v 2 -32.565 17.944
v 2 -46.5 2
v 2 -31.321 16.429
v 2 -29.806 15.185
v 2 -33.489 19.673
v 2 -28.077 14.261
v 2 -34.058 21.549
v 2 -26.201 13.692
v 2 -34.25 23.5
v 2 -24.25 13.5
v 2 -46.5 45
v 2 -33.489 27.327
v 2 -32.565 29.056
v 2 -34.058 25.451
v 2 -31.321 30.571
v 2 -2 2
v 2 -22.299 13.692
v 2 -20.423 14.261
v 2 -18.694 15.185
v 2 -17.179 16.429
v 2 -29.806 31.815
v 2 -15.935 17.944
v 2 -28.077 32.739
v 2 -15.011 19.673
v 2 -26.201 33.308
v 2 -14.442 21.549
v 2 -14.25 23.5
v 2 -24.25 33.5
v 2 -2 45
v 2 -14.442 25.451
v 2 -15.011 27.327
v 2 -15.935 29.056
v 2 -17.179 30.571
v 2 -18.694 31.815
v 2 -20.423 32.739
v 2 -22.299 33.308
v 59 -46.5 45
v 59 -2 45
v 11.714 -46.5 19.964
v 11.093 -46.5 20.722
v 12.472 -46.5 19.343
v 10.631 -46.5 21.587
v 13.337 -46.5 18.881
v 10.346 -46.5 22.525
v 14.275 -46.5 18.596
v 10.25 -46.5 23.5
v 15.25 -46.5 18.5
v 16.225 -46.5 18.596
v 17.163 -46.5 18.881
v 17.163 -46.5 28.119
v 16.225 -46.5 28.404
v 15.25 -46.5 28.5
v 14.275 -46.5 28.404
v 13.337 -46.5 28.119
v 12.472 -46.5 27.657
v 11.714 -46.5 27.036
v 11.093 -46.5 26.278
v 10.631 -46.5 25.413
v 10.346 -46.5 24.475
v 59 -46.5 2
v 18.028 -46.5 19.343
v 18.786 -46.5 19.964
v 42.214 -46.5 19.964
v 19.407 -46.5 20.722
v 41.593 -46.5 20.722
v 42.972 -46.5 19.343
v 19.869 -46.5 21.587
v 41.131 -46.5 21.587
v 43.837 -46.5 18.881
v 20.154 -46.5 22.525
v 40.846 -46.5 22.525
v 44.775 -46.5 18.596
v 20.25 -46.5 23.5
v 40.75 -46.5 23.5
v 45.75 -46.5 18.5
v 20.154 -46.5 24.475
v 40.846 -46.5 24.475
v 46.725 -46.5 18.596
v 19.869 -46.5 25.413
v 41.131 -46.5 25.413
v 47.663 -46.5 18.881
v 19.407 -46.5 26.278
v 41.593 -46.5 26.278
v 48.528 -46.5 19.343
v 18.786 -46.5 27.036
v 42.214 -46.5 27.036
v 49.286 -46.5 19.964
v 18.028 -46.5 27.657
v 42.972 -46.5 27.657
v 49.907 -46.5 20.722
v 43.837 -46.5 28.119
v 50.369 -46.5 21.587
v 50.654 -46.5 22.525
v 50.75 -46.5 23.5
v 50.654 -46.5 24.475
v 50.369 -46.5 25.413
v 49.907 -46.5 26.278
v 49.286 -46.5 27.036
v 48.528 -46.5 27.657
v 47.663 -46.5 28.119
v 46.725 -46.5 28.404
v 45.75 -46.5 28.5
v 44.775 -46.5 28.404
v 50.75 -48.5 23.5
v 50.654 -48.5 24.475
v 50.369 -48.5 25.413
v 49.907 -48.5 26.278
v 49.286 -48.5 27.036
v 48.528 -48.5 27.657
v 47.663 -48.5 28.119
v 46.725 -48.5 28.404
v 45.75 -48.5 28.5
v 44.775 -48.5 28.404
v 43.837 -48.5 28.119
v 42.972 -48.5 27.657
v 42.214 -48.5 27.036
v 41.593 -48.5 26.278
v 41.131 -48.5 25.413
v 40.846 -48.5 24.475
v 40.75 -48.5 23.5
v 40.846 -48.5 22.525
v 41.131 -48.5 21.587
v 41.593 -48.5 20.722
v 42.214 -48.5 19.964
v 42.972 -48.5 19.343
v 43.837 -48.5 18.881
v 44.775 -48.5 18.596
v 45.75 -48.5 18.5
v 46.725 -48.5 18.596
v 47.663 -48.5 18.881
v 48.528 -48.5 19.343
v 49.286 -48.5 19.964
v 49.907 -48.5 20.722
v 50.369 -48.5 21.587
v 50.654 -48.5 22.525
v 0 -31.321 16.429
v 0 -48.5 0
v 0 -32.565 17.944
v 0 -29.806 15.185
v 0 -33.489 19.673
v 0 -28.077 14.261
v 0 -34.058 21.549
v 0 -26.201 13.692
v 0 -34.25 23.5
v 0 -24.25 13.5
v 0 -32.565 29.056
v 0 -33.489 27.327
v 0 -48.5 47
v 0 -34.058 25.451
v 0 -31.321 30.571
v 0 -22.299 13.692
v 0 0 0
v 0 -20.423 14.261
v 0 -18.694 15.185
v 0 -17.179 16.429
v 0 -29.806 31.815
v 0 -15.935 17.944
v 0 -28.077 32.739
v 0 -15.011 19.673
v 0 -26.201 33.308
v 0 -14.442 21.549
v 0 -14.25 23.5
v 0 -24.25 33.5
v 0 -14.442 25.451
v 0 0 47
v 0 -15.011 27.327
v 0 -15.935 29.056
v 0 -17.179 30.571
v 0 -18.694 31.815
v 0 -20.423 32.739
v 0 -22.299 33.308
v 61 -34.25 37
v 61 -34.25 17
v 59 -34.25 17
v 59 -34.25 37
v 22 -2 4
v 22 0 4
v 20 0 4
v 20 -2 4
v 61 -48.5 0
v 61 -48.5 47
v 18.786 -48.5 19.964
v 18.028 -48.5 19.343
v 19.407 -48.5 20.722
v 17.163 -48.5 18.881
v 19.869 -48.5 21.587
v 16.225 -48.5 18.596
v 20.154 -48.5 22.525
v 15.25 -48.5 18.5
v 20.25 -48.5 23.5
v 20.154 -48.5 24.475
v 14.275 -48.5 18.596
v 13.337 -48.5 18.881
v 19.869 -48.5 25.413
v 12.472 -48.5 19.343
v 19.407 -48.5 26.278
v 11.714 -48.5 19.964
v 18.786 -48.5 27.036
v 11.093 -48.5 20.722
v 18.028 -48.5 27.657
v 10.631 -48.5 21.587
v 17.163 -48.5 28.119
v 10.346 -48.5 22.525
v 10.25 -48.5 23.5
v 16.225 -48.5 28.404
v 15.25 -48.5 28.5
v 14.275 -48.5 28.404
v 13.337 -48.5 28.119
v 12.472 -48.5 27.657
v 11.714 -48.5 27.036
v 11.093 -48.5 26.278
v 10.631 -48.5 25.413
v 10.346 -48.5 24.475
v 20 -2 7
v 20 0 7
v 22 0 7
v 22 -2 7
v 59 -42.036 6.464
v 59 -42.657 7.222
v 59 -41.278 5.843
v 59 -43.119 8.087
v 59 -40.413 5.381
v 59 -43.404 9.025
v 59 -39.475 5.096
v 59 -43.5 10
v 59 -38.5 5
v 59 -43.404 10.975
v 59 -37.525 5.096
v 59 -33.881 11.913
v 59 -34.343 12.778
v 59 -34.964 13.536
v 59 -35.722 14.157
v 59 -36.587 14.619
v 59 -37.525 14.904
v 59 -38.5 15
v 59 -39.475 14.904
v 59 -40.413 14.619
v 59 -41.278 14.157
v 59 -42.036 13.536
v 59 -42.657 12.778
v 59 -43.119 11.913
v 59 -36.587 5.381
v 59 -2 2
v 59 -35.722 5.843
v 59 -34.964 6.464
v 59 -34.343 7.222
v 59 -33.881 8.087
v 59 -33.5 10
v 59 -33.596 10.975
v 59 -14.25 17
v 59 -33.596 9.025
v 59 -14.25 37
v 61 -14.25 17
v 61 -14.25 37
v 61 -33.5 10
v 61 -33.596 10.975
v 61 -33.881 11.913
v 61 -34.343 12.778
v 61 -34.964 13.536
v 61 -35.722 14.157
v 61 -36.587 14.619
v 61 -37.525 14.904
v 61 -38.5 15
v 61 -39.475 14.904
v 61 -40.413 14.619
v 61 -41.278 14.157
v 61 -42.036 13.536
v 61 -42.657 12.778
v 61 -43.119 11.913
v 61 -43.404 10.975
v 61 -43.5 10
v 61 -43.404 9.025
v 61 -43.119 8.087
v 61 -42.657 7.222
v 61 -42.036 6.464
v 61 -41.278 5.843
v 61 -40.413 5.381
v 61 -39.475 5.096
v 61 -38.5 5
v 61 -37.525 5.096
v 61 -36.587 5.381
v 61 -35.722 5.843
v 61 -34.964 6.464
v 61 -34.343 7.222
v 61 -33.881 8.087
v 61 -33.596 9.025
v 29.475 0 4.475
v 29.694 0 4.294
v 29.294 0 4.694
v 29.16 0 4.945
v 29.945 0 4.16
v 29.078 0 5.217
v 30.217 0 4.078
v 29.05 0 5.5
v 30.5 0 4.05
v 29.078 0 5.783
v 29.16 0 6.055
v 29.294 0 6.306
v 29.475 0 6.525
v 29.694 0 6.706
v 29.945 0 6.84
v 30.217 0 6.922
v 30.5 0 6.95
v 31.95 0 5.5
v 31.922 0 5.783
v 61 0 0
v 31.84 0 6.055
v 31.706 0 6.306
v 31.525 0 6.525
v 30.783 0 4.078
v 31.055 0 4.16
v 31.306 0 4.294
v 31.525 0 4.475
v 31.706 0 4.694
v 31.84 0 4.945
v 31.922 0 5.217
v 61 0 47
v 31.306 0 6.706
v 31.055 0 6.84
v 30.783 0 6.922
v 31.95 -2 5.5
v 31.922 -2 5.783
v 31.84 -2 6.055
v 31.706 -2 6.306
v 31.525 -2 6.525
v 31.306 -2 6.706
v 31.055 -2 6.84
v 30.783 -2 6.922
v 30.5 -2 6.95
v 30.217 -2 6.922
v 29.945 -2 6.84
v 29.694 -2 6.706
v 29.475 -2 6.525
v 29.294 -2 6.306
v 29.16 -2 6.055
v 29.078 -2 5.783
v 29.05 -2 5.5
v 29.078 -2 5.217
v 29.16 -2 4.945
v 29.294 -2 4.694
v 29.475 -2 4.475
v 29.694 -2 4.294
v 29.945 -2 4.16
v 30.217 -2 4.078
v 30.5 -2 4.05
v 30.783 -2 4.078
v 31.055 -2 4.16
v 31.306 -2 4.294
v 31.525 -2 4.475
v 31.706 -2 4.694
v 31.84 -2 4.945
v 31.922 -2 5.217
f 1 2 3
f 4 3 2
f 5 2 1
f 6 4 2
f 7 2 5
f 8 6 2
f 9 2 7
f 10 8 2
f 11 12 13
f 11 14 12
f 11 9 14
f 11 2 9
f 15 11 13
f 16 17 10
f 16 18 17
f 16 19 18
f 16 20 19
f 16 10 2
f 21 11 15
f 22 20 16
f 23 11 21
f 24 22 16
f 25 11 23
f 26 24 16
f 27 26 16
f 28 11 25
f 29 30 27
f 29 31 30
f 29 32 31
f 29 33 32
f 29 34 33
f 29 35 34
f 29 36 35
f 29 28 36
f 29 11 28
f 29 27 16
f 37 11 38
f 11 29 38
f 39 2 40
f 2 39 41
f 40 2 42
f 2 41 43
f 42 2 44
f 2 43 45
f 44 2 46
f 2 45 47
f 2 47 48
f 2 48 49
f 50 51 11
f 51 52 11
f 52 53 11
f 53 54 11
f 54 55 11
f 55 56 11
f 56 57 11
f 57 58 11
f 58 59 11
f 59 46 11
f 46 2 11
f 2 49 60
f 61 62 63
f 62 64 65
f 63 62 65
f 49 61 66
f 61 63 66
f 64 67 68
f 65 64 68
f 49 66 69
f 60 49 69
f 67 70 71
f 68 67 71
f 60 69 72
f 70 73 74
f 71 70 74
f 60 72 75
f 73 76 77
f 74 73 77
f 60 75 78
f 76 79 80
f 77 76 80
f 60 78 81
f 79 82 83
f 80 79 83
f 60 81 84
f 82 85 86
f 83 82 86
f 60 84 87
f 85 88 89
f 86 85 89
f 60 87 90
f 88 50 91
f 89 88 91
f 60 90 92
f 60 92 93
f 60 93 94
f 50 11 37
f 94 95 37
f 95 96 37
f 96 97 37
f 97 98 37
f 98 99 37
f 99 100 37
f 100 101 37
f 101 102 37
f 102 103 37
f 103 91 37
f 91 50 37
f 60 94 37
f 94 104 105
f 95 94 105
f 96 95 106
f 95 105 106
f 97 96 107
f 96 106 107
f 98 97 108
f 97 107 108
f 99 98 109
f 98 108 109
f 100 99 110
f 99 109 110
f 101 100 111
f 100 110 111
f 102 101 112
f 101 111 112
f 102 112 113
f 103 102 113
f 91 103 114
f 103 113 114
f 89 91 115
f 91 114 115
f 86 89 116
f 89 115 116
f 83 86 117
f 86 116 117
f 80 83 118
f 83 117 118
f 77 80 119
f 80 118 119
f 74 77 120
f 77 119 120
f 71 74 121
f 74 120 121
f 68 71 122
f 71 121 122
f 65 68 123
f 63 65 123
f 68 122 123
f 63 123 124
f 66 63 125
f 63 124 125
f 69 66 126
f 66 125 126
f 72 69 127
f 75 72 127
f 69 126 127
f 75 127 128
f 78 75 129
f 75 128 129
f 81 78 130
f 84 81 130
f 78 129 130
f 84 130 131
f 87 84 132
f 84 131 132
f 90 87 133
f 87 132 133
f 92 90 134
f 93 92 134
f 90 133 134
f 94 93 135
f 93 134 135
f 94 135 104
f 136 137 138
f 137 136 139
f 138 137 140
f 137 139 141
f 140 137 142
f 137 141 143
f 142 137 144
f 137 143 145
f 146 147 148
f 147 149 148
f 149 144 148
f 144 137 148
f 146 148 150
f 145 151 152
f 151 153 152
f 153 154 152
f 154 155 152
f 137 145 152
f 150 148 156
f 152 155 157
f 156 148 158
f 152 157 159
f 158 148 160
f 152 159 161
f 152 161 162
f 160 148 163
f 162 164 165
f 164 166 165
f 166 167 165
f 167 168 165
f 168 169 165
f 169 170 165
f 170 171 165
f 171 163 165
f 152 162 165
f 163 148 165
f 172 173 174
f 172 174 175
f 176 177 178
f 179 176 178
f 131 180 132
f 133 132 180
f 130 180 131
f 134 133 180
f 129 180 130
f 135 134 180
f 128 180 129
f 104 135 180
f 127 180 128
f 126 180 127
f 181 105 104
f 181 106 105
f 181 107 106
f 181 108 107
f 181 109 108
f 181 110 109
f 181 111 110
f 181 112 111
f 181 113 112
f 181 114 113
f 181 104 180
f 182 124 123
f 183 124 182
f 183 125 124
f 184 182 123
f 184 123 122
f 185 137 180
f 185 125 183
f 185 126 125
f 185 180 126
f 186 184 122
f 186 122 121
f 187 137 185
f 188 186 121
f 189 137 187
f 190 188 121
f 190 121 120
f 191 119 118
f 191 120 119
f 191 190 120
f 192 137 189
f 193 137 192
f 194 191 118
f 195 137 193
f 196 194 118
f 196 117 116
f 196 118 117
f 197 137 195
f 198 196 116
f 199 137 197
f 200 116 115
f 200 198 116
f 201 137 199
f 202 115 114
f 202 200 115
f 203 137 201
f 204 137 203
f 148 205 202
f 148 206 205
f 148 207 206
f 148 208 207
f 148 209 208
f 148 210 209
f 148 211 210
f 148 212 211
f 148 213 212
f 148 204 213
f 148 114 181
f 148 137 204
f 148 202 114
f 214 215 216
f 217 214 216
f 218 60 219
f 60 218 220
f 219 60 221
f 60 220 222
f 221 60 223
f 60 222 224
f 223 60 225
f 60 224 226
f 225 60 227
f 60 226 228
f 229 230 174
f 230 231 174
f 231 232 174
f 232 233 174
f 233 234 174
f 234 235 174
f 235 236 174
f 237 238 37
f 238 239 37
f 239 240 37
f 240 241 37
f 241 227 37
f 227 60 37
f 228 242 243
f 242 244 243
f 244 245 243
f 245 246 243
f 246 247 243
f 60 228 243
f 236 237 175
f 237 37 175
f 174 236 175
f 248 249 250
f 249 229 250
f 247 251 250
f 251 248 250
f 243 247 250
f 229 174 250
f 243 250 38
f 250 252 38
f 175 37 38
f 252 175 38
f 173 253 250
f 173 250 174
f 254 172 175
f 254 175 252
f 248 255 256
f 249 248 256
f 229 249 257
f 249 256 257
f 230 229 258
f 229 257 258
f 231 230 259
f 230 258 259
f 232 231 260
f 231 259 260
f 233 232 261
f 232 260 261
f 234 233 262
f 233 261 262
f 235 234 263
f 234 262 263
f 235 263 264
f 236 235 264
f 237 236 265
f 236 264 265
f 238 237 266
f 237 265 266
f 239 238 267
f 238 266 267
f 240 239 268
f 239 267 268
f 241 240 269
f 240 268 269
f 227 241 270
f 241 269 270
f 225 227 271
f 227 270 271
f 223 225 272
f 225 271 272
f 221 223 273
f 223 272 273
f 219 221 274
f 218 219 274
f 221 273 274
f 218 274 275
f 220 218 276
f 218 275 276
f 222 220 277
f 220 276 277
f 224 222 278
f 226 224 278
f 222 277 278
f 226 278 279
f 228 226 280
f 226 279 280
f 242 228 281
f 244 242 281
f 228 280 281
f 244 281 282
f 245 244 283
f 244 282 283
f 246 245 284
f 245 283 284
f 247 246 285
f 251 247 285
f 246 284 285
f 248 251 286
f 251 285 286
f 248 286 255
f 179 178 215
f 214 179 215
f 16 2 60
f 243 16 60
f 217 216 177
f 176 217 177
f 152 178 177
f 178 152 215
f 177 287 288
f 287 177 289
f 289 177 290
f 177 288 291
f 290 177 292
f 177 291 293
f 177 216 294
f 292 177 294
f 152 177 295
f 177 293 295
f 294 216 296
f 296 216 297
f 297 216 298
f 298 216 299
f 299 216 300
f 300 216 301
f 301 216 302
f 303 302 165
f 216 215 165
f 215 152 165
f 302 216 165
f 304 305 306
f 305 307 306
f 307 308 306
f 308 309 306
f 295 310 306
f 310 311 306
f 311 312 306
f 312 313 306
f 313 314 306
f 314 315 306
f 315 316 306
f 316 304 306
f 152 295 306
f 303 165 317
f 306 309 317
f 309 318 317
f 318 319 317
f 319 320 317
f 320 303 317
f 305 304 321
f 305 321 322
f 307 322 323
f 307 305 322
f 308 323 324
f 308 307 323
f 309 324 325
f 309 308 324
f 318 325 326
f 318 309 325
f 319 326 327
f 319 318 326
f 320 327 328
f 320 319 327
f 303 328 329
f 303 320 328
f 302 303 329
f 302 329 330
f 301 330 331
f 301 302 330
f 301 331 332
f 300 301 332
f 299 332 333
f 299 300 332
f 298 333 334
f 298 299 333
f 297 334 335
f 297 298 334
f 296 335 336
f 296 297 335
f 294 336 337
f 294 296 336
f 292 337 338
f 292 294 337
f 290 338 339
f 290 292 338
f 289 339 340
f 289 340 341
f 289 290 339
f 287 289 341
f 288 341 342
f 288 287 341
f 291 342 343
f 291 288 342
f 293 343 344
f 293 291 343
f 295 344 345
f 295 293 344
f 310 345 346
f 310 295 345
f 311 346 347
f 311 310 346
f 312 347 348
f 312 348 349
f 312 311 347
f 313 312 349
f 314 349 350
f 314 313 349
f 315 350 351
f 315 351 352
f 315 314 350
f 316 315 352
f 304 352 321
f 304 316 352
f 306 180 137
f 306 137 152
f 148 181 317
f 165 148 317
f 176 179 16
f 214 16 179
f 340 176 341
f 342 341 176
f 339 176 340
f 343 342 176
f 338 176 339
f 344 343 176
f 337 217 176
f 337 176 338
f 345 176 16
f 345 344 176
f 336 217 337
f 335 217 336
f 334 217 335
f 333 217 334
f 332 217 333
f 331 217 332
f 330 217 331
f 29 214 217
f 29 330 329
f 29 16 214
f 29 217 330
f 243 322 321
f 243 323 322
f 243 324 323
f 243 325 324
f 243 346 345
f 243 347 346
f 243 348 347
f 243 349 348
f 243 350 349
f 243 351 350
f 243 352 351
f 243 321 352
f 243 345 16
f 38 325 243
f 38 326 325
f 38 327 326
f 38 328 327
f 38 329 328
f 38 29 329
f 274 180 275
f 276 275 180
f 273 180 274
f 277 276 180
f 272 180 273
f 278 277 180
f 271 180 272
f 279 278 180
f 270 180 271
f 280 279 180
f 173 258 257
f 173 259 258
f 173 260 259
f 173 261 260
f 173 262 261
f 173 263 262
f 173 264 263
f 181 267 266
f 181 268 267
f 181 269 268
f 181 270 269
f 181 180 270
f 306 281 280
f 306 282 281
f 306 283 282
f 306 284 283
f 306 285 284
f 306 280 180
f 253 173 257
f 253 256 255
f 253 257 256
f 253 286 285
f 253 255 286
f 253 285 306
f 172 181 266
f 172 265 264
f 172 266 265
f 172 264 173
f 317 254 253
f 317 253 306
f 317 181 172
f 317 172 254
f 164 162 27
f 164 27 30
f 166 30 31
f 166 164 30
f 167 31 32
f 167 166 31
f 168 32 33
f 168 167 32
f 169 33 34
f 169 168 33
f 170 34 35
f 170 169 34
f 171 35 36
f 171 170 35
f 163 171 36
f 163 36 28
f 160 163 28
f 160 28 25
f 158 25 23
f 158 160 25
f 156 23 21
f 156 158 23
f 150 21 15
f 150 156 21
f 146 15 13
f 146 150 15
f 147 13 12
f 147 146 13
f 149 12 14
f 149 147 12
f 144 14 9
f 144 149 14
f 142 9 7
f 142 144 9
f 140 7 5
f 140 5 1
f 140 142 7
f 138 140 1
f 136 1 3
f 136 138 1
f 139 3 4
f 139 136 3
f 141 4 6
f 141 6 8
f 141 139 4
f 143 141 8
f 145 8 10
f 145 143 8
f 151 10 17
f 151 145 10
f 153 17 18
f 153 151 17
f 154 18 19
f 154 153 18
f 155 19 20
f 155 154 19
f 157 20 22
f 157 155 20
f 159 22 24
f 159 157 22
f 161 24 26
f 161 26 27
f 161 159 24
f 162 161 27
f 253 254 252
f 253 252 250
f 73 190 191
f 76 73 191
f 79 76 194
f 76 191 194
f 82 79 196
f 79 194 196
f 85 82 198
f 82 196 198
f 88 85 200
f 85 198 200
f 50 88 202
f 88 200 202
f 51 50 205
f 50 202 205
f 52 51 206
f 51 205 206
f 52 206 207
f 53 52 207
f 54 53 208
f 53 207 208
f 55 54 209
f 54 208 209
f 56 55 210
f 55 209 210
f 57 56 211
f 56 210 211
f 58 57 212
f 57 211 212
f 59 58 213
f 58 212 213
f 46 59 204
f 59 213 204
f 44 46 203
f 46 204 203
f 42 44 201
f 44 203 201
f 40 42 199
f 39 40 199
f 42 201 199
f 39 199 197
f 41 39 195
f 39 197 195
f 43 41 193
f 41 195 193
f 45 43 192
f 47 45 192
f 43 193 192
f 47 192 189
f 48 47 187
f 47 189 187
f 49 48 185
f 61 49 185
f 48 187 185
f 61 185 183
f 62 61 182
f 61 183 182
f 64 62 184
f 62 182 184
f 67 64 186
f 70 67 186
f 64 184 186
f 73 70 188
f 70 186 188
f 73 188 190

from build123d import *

# Parameters (mm, degrees)
F0_W      = 61
F0_H      = 47
F0_R      = 1.45
F1_DEPTH  = 2
F3_W      = 48.5
F3_H      = 47
F3_R      = 5
F4_DEPTH  = 2
F5_W      = 48.5
F5_H      = 47
F5_R      = 10
F6_DEPTH  = 2
F8_W      = 61
F8_H      = 47
F8_R      = 5
F9_DEPTH  = 2
F11_W     = 61
F11_H     = 48.5
F12_DEPTH = 2
F14_W     = 61
F14_H     = 48.5
F15_DEPTH = 2


with BuildPart() as f1:
    # F0 (on Front) → F1 (new body)
    with BuildSketch(Plane.XZ):
        with Locations((30.5, 23.5)):
            Rectangle(F0_W, F0_H)
        Polygon((20, 5.5), (20, 7), (22, 7), (22, 5.5), (22, 4), (20, 4), align=None, mode=Mode.SUBTRACT)
        with Locations((30.5, 5.5)):
            Circle(F0_R, mode=Mode.SUBTRACT)
    extrude(amount=F1_DEPTH)

    # F3 (on offset) → F4 (join)
    with BuildSketch(Plane.YZ.offset(61)):
        with Locations((-24.25, 23.5)):
            Rectangle(F3_W, F3_H)
        with Locations((-38.5, 10)):
            Circle(F3_R, mode=Mode.SUBTRACT)
        Polygon((-34.25, 37), (-24.25, 37), (-14.25, 37), (-14.25, 17), (-34.25, 17), align=None, mode=Mode.SUBTRACT)
    extrude(amount=-F4_DEPTH)

    # F5 (on Right) → F6 (join)
    with BuildSketch(Plane.YZ):
        with Locations((-24.25, 23.5)):
            Rectangle(F5_W, F5_H)
        with Locations((-24.25, 23.5)):
            Circle(F5_R, mode=Mode.SUBTRACT)
    extrude(amount=F6_DEPTH)

    # F8 (on offset) → F9 (join)
    with BuildSketch(Plane.XZ.offset(48.5)):
        with Locations((30.5, 23.5)):
            Rectangle(F8_W, F8_H)
        with Locations((15.25, 23.5)):
            Circle(F8_R, mode=Mode.SUBTRACT)
        with Locations((45.75, 23.5)):
            Circle(F8_R, mode=Mode.SUBTRACT)
    extrude(amount=-F9_DEPTH)

    # F11 (on offset) → F12 (join)
    with BuildSketch(Plane.XY.offset(47)):
        with Locations((30.5, -24.25)):
            Rectangle(F11_W, F11_H)
    extrude(amount=-F12_DEPTH)

    # F14 (on offset) → F15 (join)
    with BuildSketch(Plane(origin=(0, 0, 0), x_dir=(1, 0, 0), z_dir=(0, 0, -1))):
        with Locations((30.5, 24.25)):
            Rectangle(F14_W, F14_H)
    extrude(amount=-F15_DEPTH)


solid = f1.part
